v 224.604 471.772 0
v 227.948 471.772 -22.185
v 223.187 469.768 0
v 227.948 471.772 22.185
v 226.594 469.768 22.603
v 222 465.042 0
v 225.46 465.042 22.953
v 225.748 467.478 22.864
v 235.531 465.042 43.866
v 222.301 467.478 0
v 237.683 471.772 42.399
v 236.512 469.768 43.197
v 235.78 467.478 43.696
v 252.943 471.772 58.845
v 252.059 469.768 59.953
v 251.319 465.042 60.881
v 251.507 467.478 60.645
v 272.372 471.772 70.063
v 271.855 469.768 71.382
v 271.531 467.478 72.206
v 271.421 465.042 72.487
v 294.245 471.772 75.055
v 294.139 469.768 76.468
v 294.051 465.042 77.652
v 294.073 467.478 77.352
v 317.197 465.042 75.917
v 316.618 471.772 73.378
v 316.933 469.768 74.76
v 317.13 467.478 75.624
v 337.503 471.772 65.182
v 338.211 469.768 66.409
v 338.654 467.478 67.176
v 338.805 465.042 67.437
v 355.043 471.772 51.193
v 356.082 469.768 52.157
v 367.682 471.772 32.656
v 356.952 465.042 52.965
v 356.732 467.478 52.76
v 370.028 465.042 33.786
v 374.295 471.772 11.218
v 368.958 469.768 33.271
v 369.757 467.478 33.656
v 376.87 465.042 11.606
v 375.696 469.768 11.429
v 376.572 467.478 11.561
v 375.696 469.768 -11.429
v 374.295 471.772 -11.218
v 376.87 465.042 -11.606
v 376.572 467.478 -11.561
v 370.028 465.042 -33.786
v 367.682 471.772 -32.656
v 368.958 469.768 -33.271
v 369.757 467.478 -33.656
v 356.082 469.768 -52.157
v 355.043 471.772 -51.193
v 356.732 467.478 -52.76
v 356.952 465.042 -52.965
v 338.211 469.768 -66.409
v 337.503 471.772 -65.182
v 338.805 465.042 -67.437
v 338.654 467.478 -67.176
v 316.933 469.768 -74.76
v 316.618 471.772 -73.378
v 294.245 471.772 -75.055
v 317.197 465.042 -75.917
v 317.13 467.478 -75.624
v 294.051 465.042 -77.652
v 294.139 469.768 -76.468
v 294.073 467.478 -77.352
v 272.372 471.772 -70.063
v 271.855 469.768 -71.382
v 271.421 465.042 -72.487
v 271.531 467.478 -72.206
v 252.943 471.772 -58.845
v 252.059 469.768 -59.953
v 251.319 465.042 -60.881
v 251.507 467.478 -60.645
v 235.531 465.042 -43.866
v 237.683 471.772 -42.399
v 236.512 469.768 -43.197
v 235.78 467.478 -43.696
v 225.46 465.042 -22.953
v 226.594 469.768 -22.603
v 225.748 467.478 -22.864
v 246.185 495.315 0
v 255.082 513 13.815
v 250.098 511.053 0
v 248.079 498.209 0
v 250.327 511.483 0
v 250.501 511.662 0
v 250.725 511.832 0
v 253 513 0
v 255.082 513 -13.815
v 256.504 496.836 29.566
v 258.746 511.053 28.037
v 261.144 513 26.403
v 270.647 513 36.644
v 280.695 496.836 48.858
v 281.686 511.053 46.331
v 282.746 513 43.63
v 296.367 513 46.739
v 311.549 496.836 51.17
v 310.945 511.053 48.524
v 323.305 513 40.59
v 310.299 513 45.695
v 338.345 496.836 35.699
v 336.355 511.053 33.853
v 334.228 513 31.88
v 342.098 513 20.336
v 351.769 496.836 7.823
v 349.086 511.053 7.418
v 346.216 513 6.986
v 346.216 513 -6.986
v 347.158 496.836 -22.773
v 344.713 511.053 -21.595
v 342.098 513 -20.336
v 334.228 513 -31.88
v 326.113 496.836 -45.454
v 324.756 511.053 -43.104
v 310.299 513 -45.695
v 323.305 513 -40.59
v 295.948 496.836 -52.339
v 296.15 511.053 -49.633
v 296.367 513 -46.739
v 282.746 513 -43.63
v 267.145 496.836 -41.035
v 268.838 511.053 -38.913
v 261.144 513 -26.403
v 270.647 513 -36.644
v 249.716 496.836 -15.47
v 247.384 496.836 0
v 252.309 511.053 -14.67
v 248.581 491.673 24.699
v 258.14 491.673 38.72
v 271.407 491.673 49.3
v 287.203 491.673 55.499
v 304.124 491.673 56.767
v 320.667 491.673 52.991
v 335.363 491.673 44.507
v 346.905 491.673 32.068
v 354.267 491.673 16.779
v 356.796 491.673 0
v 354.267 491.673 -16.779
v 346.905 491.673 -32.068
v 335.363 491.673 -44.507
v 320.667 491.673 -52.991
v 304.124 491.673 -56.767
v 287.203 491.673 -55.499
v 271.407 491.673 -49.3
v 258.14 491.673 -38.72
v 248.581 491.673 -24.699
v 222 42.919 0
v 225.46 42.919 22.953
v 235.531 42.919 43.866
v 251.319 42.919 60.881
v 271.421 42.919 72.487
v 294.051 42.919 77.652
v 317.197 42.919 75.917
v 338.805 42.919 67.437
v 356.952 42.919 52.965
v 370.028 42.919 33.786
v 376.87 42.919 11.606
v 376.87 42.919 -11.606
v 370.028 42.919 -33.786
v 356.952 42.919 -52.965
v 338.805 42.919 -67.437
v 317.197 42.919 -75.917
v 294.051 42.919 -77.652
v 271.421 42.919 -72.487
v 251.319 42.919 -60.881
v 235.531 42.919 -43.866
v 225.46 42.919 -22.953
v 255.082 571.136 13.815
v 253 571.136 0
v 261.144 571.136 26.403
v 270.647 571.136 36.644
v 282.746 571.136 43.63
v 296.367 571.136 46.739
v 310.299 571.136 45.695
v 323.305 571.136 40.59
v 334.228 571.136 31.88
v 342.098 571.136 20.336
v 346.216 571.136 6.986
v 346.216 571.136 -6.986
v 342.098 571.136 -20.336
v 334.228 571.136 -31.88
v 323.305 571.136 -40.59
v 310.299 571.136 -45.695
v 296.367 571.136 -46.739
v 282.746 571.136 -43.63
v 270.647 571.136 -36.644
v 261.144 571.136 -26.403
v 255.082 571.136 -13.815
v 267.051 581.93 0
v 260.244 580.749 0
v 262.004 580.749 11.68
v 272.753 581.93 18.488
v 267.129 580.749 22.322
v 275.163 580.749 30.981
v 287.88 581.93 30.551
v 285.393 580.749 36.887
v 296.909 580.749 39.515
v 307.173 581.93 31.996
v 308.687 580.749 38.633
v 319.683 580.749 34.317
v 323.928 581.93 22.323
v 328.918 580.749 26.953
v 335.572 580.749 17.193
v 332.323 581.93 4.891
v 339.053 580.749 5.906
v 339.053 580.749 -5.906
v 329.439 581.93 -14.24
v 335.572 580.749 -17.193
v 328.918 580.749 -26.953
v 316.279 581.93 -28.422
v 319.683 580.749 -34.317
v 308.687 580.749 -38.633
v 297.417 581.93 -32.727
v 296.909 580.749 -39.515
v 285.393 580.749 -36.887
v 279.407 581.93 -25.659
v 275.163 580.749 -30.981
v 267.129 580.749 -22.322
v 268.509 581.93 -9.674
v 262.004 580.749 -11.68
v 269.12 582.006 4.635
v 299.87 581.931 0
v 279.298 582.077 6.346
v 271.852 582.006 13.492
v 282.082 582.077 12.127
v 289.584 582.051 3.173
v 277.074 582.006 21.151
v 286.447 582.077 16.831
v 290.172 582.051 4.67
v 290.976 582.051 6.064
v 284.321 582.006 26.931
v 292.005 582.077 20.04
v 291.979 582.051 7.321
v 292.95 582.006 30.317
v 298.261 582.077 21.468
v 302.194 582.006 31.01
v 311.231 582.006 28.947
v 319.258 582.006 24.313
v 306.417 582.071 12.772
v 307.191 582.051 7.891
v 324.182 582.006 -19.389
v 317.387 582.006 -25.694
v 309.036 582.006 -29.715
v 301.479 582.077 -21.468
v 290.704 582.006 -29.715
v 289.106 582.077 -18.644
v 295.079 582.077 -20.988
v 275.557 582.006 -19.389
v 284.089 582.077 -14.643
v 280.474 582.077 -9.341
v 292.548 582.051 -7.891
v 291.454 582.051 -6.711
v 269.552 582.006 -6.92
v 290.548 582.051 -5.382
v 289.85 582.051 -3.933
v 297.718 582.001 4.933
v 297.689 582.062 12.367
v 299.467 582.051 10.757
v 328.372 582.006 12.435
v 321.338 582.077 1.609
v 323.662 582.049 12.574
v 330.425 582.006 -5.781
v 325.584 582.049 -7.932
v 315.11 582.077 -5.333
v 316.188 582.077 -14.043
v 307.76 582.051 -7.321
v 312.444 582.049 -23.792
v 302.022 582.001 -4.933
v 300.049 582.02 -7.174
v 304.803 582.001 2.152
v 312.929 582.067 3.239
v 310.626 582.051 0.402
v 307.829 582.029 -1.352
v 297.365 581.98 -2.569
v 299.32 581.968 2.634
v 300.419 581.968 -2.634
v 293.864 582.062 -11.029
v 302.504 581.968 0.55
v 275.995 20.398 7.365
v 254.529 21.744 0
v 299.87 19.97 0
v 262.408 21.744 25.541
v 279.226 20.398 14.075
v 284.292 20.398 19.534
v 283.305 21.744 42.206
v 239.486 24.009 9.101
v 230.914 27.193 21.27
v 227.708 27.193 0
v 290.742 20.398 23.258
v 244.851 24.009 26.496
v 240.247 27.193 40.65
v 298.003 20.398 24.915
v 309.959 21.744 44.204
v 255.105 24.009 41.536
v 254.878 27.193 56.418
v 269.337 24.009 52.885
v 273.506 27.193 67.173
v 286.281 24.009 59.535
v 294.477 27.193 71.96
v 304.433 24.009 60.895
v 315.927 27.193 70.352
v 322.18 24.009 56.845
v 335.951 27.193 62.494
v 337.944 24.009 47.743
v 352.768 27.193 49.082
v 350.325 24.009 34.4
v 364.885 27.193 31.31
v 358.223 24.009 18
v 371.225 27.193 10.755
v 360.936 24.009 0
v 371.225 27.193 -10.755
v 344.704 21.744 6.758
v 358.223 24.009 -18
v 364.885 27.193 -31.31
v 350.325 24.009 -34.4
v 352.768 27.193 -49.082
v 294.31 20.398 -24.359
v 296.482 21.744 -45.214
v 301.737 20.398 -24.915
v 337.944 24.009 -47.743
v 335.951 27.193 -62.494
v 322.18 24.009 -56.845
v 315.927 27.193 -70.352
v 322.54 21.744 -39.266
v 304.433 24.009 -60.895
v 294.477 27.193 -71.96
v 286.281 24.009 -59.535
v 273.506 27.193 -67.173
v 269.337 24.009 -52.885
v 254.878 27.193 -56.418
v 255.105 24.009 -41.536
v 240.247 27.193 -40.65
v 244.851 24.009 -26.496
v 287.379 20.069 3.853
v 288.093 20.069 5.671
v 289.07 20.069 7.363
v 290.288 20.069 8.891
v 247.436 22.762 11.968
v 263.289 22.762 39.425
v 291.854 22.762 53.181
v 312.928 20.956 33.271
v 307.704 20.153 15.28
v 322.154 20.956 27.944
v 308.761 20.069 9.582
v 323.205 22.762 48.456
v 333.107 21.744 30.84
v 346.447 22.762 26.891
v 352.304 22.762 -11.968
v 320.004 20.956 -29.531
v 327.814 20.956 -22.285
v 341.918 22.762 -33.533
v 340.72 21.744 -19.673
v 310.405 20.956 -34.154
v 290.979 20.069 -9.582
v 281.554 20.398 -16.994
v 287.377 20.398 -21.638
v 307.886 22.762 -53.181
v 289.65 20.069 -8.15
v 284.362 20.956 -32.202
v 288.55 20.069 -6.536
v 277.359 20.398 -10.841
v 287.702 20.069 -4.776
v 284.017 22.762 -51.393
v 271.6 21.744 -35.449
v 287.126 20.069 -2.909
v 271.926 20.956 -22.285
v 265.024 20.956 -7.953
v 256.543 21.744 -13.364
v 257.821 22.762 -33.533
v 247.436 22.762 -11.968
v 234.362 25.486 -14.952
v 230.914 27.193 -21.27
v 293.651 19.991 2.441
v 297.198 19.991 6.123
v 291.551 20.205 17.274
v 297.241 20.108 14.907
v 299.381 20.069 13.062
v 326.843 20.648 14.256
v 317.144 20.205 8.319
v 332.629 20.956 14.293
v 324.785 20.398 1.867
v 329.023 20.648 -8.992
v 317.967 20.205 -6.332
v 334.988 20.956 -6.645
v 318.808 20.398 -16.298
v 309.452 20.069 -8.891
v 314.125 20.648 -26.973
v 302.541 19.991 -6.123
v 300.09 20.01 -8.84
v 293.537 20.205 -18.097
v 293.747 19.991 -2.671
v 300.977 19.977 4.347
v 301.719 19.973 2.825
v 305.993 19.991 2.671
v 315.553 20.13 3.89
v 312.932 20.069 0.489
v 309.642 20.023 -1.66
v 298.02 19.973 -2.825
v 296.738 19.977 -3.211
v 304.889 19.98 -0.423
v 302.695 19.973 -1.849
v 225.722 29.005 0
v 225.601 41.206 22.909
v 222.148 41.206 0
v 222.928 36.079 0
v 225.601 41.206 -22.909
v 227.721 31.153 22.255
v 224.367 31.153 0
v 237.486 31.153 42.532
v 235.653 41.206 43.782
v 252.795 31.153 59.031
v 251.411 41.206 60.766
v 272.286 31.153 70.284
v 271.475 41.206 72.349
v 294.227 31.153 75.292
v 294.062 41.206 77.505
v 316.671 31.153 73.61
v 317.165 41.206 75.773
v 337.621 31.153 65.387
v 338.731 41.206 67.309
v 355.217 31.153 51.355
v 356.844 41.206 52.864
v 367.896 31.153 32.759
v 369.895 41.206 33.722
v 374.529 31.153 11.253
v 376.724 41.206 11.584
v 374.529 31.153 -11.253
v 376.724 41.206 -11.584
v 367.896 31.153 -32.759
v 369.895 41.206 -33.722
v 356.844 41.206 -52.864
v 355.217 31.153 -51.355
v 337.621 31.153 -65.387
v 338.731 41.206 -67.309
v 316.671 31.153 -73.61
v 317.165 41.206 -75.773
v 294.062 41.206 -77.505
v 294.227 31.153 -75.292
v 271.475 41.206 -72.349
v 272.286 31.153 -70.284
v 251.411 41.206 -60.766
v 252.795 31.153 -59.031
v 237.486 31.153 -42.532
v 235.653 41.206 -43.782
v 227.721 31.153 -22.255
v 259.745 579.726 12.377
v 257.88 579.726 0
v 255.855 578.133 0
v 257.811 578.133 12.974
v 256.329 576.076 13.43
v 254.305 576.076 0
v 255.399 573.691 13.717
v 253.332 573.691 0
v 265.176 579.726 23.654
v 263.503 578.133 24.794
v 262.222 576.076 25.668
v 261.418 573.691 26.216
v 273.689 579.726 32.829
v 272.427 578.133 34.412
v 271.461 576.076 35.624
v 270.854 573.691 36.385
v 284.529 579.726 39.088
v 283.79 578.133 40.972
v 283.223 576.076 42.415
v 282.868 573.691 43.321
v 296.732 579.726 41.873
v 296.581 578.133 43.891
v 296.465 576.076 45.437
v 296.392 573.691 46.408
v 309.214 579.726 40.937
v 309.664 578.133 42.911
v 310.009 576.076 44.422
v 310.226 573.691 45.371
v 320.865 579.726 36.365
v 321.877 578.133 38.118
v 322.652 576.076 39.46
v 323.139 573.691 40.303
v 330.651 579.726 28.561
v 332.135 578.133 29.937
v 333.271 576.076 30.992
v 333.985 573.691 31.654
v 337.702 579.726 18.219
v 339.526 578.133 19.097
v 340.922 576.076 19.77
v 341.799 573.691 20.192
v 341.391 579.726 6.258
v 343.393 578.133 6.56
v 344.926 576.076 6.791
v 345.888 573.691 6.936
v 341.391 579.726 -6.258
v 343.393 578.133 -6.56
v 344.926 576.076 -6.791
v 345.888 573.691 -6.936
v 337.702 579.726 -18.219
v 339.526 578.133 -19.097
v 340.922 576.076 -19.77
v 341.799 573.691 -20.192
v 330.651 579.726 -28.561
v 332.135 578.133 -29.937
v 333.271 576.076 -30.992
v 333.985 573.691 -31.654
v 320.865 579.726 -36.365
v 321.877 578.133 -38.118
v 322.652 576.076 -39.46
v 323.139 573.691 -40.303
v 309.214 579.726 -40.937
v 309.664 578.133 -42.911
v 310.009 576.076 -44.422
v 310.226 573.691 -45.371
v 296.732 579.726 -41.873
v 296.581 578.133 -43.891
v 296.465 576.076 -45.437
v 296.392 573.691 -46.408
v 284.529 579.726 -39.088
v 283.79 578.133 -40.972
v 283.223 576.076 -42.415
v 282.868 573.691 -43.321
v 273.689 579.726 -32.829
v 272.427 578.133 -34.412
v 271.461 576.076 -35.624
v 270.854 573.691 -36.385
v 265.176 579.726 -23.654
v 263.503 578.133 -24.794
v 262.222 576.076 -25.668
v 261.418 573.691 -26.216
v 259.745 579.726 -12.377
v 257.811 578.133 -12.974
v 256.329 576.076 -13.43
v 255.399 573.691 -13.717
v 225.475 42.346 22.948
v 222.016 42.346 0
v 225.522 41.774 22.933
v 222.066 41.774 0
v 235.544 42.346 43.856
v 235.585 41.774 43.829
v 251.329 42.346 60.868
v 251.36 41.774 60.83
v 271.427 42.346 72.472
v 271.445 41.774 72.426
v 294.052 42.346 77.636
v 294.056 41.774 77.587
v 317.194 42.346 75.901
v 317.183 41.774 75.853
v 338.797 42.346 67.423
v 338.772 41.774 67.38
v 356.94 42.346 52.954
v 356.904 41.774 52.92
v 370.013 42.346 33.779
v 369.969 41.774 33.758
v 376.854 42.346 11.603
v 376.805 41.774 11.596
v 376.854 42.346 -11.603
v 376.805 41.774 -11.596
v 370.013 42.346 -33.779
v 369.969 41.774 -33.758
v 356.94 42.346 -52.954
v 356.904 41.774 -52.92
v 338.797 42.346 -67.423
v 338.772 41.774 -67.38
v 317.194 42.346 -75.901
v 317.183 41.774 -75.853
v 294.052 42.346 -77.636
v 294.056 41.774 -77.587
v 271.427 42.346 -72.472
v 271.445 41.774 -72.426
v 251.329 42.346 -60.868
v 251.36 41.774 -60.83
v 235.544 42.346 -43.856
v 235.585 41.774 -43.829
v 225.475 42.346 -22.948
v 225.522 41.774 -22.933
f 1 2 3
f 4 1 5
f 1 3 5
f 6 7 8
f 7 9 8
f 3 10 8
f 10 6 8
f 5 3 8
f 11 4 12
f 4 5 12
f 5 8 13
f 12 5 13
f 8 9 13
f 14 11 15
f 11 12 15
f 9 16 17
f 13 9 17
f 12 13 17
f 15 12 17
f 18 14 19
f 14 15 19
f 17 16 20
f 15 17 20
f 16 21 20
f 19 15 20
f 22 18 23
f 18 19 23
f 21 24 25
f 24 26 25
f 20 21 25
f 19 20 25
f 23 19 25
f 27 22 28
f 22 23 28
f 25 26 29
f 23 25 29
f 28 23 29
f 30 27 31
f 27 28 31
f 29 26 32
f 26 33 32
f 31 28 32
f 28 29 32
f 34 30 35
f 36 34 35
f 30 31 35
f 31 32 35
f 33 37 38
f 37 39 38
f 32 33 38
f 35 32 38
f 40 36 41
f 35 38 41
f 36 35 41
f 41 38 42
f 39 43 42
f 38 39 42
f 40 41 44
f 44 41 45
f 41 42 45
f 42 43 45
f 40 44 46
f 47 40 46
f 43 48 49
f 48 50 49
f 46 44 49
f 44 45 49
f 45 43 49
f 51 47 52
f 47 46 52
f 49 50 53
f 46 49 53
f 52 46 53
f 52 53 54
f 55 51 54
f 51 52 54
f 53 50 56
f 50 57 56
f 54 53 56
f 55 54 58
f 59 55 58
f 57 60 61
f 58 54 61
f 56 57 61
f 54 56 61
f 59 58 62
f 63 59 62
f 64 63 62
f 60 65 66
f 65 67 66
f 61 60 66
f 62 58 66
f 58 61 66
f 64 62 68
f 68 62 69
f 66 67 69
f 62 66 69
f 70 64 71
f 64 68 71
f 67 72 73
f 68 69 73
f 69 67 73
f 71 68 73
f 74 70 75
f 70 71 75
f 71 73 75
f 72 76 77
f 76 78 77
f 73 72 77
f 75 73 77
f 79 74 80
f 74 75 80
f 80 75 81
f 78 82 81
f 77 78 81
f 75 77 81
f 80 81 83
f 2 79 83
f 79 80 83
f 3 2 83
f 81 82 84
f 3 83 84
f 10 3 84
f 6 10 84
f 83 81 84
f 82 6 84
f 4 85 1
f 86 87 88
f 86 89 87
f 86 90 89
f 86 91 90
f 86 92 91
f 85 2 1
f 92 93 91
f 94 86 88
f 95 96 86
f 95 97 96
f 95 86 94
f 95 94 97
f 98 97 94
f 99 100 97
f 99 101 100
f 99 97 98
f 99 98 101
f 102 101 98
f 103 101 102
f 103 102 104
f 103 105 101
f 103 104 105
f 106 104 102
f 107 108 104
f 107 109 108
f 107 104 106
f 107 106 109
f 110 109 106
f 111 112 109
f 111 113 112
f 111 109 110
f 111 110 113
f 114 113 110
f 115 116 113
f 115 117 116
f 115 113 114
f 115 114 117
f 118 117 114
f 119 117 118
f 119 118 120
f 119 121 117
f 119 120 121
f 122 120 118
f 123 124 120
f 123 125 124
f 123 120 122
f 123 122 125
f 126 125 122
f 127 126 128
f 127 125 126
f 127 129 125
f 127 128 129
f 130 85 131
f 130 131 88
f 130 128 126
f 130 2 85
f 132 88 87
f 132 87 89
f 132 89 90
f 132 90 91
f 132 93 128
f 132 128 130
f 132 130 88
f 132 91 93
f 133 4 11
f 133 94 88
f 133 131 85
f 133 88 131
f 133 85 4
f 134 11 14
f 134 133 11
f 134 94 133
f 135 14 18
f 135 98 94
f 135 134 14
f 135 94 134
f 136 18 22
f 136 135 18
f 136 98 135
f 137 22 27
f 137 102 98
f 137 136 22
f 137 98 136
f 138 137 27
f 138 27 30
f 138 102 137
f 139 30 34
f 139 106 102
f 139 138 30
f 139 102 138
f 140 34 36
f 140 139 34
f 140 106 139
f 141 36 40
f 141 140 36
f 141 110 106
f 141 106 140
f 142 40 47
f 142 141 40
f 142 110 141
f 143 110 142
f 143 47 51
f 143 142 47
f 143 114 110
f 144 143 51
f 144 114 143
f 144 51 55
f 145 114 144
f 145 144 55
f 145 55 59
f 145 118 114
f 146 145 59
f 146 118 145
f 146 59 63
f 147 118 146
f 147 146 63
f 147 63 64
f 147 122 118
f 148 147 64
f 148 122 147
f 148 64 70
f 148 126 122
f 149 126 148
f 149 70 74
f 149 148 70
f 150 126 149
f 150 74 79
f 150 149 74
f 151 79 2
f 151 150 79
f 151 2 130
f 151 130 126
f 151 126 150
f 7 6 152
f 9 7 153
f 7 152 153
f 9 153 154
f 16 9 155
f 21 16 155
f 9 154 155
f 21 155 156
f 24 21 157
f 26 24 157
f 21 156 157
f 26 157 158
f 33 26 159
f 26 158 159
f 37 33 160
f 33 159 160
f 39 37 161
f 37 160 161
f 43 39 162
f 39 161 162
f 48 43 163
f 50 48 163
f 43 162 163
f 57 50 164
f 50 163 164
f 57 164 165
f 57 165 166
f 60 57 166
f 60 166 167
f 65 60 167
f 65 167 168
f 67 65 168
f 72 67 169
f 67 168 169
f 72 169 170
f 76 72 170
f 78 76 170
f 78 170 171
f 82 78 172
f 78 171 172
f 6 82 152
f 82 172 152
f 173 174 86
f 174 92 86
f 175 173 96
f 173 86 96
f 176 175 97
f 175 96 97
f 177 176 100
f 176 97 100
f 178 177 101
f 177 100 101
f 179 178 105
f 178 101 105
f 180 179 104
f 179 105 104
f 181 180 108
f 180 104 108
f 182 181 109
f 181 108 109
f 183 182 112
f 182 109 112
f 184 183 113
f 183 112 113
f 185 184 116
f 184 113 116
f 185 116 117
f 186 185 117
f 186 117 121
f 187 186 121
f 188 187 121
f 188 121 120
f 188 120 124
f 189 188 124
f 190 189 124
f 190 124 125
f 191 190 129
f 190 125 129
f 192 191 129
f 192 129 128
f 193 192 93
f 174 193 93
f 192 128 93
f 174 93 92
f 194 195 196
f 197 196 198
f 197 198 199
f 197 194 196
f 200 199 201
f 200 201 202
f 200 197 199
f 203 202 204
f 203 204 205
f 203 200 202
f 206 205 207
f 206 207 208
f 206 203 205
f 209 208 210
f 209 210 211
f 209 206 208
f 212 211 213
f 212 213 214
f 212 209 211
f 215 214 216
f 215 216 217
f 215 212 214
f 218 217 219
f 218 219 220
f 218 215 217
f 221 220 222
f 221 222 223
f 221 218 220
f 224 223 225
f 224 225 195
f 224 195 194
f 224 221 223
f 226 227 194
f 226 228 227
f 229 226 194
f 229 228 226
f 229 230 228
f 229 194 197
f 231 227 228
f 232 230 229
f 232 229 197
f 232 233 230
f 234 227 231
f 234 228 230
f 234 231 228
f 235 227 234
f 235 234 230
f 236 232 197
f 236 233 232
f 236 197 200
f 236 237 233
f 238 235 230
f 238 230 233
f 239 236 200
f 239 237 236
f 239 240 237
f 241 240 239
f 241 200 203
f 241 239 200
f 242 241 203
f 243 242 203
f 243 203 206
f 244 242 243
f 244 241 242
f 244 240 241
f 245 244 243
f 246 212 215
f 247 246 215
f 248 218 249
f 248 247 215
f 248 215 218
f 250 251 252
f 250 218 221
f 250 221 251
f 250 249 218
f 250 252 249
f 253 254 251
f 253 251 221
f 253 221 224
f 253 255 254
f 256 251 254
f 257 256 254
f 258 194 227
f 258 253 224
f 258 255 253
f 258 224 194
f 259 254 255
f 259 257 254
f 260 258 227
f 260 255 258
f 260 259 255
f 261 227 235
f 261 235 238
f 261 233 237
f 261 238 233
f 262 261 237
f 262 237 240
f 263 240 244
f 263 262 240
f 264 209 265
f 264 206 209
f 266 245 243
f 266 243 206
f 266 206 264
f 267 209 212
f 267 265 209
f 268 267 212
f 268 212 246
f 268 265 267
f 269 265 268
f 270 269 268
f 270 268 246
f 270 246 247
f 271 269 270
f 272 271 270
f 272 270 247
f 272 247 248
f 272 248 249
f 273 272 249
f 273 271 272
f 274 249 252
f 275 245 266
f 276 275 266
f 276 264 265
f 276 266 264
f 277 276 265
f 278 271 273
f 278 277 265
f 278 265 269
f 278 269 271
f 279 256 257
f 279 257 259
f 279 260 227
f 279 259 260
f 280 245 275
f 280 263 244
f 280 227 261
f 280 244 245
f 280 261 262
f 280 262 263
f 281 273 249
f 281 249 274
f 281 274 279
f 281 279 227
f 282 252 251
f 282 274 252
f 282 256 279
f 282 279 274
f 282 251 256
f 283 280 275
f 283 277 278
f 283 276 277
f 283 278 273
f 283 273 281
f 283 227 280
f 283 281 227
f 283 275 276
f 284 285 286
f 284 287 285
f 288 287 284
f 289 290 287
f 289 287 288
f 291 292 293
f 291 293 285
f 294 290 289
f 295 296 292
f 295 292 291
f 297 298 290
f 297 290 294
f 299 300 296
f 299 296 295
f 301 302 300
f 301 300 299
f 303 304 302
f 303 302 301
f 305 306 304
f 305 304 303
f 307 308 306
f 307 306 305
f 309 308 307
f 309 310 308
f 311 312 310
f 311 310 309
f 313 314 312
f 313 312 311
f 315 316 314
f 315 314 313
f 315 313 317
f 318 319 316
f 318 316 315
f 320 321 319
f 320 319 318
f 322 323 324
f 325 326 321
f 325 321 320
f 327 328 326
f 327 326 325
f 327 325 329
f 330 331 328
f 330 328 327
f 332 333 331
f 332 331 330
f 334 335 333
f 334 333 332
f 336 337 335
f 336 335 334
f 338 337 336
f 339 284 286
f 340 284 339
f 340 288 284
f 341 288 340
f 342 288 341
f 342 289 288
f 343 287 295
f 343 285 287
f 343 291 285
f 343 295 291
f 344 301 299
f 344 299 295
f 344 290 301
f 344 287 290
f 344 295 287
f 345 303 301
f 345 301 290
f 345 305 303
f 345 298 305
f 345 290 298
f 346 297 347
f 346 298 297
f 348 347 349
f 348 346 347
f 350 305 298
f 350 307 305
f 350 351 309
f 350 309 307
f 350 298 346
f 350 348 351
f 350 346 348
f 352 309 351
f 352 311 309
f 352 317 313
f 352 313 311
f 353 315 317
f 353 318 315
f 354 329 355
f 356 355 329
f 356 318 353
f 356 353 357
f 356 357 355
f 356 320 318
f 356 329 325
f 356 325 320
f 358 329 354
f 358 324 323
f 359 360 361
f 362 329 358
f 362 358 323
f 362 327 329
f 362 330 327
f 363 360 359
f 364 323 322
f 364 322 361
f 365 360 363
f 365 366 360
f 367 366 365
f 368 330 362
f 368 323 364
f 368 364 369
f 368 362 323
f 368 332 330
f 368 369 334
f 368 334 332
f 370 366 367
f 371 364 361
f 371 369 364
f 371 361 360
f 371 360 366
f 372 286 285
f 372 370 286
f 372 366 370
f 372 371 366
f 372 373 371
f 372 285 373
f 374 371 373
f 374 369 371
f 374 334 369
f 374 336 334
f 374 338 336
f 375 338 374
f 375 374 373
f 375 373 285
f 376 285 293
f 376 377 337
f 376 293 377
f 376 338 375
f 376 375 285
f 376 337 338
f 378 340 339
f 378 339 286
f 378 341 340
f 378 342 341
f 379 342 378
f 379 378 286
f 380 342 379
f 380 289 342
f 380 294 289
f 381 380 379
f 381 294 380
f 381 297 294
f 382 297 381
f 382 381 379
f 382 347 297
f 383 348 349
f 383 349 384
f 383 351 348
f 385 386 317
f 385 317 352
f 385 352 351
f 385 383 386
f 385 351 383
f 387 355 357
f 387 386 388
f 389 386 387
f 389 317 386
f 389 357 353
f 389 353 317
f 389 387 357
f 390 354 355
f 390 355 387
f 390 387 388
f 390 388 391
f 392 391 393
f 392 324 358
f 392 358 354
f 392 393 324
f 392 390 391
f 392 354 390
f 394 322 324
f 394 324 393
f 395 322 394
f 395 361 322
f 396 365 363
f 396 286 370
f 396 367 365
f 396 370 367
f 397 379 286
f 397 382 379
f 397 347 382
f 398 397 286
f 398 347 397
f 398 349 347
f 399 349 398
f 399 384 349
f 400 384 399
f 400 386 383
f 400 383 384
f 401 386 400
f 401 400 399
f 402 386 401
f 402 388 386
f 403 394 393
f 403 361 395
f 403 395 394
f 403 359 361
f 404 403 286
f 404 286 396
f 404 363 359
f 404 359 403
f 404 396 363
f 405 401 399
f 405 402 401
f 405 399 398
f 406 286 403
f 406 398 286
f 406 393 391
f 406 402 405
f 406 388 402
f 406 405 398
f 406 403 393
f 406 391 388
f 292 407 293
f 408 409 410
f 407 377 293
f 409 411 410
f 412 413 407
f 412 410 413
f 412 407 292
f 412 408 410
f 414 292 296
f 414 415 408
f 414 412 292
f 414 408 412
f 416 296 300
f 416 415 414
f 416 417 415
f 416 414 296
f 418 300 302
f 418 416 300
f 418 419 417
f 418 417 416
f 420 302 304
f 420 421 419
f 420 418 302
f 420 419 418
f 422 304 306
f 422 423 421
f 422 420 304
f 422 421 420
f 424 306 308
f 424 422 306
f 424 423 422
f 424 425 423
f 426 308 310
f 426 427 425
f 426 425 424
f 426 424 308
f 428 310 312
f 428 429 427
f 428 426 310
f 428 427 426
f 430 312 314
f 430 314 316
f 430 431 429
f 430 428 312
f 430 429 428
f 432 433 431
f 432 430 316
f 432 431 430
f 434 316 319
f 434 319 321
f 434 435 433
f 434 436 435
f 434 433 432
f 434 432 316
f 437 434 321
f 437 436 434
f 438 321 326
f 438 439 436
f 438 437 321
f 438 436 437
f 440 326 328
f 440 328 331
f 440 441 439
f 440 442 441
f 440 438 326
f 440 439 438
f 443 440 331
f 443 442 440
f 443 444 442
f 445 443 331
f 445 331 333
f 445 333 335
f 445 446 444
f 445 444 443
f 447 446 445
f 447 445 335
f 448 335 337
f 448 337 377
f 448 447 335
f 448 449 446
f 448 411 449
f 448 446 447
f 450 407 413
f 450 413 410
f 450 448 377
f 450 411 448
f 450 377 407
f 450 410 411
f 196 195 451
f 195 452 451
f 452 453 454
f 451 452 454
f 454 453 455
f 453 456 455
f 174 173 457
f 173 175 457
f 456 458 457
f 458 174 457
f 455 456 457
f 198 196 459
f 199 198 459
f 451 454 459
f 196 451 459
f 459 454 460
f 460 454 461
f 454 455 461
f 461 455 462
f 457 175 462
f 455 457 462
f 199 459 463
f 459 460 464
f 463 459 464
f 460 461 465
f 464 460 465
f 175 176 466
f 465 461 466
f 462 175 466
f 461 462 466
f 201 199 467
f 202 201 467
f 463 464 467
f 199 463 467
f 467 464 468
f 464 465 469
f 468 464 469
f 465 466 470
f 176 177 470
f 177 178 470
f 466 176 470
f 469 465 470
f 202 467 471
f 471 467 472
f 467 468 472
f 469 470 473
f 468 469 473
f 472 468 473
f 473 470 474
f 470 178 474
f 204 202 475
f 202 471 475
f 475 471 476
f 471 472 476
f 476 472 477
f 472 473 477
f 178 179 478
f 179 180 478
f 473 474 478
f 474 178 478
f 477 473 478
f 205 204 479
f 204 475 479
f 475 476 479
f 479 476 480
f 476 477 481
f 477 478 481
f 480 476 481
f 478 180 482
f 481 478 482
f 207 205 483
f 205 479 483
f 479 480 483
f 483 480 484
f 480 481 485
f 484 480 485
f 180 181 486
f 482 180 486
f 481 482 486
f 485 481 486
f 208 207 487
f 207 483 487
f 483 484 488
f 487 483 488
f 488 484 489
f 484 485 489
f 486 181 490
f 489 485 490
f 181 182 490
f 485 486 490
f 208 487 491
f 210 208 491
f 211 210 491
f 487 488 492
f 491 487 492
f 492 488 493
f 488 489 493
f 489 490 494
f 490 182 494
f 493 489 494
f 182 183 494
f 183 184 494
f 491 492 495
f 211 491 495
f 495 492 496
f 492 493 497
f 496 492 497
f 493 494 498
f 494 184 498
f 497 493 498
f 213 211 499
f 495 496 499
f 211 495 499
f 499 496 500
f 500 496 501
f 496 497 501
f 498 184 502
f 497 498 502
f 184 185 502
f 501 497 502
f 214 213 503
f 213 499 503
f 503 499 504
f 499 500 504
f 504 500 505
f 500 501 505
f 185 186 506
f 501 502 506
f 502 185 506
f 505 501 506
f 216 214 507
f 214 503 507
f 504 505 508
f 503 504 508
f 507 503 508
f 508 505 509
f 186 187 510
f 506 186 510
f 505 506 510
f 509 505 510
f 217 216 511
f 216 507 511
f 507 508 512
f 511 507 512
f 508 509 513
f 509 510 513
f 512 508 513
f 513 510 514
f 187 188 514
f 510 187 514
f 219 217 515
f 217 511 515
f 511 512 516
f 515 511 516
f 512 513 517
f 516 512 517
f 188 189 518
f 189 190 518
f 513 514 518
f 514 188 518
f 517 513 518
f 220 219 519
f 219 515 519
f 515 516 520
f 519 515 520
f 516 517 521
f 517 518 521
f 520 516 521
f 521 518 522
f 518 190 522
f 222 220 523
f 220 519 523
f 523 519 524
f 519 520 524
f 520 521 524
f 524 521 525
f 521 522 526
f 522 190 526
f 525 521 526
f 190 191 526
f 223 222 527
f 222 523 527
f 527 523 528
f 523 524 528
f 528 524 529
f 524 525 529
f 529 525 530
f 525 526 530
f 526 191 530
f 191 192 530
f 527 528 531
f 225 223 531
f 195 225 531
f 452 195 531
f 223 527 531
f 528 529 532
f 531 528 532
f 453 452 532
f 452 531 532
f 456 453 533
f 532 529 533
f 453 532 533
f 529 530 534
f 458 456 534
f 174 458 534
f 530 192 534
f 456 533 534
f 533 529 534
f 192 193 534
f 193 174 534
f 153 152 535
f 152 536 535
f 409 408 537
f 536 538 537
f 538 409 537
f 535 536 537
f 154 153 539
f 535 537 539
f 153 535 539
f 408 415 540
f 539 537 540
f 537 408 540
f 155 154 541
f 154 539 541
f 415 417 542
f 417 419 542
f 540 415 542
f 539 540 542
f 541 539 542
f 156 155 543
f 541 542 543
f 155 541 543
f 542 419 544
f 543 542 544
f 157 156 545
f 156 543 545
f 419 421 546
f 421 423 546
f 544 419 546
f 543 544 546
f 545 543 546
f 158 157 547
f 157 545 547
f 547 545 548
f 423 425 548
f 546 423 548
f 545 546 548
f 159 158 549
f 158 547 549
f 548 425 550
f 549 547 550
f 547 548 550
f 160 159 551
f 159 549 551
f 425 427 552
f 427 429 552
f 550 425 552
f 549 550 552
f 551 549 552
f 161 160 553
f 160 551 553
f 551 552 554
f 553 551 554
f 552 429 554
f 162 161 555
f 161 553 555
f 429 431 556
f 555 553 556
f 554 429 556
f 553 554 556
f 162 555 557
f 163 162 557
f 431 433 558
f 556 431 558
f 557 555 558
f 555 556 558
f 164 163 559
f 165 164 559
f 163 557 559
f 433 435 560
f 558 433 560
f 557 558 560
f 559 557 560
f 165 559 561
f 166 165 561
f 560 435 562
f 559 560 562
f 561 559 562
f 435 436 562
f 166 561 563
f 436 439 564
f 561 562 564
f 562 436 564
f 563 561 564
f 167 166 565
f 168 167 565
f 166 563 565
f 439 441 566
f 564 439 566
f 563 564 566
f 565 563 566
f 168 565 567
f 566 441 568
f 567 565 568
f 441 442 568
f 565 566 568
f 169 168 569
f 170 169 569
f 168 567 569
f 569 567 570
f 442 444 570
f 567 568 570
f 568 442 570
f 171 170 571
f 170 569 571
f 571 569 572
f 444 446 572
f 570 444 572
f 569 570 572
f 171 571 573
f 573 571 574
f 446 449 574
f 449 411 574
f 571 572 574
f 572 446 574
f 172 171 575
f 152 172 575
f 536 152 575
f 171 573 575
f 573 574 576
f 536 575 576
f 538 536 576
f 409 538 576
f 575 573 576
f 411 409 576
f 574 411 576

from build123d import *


with BuildPart() as part:
    # Sketch1 → Revolve1 (revolve)
    with BuildSketch(Plane.XY):
        with BuildLine():
            Line((299.869822457, 19.969981452), (299.869822457, 581.9306305))
            add(Edge.make_bspline(
                [(260.243694036, 580.74911208), (263.082956961, 581.563236016), (266.059385675, 581.972800203), (269, 582.009104084), (279.289376505, 582.136133423), (289.579854883, 582.084453334), (299.869822457, 581.9306305)],
                knots=[1.210890247, 1.210890247, 1.210890247, 1.210890247, 2, 2, 2, 2.440961889, 2.440961889, 2.440961889, 2.440961889], degree=3))
            ThreePointArc((260.243694036, 580.74911208), (255.013666059, 577.154654049), (253, 571.136475738))
            Line((253, 571.136475738), (253, 513))
            add(Edge.make_bspline(
                [(224.604387653, 471.772395411), (231.364357938, 479.199956822), (238.40494302, 486.462792022), (245, 494), (246.09750768, 495.254294491), (247.381015539, 496.452538849), (248, 498), (248.753027097, 499.882567742), (248.575161437, 502.017420038), (249, 504), (250.83185132, 512.548639496), (248.636070132, 510.818035066), (253, 513)],
                knots=[1.073552287, 1.073552287, 1.073552287, 1.073552287, 2, 2, 2, 3, 3, 3, 4, 4, 4, 5, 5, 5, 5], degree=3))
            ThreePointArc((224.604387653, 471.772395411), (222.673797036, 468.650094884), (222, 465.041502601))
            Line((222, 465.041502601), (222, 42.919041115))
            ThreePointArc((222, 42.919041115), (222.037005327, 42.059542919), (222.14774743, 41.206405924))
            add(Edge.make_bspline(
                [(227.708226393, 27.19266873), (223.001482513, 30.417198271), (223.012565993, 36.231376239), (222.14774743, 41.206405924)],
                knots=[8.018855033, 8.018855033, 8.018855033, 8.018855033, 8.950003244, 8.950003244, 8.950003244, 8.950003244], degree=3))
            add(Edge.make_bspline(
                [(299.869822457, 19.969981452), (245.269197516, 19.906383893), (227.708226393, 27.19266873)],
                knots=[0, 0, 0, 0.455690214, 0.455690214, 0.455690214], degree=2))
        make_face()
    revolve(axis=Axis((299.869822457, 19.969981452, 0), (0, 1, 0)))


solid = part.part
